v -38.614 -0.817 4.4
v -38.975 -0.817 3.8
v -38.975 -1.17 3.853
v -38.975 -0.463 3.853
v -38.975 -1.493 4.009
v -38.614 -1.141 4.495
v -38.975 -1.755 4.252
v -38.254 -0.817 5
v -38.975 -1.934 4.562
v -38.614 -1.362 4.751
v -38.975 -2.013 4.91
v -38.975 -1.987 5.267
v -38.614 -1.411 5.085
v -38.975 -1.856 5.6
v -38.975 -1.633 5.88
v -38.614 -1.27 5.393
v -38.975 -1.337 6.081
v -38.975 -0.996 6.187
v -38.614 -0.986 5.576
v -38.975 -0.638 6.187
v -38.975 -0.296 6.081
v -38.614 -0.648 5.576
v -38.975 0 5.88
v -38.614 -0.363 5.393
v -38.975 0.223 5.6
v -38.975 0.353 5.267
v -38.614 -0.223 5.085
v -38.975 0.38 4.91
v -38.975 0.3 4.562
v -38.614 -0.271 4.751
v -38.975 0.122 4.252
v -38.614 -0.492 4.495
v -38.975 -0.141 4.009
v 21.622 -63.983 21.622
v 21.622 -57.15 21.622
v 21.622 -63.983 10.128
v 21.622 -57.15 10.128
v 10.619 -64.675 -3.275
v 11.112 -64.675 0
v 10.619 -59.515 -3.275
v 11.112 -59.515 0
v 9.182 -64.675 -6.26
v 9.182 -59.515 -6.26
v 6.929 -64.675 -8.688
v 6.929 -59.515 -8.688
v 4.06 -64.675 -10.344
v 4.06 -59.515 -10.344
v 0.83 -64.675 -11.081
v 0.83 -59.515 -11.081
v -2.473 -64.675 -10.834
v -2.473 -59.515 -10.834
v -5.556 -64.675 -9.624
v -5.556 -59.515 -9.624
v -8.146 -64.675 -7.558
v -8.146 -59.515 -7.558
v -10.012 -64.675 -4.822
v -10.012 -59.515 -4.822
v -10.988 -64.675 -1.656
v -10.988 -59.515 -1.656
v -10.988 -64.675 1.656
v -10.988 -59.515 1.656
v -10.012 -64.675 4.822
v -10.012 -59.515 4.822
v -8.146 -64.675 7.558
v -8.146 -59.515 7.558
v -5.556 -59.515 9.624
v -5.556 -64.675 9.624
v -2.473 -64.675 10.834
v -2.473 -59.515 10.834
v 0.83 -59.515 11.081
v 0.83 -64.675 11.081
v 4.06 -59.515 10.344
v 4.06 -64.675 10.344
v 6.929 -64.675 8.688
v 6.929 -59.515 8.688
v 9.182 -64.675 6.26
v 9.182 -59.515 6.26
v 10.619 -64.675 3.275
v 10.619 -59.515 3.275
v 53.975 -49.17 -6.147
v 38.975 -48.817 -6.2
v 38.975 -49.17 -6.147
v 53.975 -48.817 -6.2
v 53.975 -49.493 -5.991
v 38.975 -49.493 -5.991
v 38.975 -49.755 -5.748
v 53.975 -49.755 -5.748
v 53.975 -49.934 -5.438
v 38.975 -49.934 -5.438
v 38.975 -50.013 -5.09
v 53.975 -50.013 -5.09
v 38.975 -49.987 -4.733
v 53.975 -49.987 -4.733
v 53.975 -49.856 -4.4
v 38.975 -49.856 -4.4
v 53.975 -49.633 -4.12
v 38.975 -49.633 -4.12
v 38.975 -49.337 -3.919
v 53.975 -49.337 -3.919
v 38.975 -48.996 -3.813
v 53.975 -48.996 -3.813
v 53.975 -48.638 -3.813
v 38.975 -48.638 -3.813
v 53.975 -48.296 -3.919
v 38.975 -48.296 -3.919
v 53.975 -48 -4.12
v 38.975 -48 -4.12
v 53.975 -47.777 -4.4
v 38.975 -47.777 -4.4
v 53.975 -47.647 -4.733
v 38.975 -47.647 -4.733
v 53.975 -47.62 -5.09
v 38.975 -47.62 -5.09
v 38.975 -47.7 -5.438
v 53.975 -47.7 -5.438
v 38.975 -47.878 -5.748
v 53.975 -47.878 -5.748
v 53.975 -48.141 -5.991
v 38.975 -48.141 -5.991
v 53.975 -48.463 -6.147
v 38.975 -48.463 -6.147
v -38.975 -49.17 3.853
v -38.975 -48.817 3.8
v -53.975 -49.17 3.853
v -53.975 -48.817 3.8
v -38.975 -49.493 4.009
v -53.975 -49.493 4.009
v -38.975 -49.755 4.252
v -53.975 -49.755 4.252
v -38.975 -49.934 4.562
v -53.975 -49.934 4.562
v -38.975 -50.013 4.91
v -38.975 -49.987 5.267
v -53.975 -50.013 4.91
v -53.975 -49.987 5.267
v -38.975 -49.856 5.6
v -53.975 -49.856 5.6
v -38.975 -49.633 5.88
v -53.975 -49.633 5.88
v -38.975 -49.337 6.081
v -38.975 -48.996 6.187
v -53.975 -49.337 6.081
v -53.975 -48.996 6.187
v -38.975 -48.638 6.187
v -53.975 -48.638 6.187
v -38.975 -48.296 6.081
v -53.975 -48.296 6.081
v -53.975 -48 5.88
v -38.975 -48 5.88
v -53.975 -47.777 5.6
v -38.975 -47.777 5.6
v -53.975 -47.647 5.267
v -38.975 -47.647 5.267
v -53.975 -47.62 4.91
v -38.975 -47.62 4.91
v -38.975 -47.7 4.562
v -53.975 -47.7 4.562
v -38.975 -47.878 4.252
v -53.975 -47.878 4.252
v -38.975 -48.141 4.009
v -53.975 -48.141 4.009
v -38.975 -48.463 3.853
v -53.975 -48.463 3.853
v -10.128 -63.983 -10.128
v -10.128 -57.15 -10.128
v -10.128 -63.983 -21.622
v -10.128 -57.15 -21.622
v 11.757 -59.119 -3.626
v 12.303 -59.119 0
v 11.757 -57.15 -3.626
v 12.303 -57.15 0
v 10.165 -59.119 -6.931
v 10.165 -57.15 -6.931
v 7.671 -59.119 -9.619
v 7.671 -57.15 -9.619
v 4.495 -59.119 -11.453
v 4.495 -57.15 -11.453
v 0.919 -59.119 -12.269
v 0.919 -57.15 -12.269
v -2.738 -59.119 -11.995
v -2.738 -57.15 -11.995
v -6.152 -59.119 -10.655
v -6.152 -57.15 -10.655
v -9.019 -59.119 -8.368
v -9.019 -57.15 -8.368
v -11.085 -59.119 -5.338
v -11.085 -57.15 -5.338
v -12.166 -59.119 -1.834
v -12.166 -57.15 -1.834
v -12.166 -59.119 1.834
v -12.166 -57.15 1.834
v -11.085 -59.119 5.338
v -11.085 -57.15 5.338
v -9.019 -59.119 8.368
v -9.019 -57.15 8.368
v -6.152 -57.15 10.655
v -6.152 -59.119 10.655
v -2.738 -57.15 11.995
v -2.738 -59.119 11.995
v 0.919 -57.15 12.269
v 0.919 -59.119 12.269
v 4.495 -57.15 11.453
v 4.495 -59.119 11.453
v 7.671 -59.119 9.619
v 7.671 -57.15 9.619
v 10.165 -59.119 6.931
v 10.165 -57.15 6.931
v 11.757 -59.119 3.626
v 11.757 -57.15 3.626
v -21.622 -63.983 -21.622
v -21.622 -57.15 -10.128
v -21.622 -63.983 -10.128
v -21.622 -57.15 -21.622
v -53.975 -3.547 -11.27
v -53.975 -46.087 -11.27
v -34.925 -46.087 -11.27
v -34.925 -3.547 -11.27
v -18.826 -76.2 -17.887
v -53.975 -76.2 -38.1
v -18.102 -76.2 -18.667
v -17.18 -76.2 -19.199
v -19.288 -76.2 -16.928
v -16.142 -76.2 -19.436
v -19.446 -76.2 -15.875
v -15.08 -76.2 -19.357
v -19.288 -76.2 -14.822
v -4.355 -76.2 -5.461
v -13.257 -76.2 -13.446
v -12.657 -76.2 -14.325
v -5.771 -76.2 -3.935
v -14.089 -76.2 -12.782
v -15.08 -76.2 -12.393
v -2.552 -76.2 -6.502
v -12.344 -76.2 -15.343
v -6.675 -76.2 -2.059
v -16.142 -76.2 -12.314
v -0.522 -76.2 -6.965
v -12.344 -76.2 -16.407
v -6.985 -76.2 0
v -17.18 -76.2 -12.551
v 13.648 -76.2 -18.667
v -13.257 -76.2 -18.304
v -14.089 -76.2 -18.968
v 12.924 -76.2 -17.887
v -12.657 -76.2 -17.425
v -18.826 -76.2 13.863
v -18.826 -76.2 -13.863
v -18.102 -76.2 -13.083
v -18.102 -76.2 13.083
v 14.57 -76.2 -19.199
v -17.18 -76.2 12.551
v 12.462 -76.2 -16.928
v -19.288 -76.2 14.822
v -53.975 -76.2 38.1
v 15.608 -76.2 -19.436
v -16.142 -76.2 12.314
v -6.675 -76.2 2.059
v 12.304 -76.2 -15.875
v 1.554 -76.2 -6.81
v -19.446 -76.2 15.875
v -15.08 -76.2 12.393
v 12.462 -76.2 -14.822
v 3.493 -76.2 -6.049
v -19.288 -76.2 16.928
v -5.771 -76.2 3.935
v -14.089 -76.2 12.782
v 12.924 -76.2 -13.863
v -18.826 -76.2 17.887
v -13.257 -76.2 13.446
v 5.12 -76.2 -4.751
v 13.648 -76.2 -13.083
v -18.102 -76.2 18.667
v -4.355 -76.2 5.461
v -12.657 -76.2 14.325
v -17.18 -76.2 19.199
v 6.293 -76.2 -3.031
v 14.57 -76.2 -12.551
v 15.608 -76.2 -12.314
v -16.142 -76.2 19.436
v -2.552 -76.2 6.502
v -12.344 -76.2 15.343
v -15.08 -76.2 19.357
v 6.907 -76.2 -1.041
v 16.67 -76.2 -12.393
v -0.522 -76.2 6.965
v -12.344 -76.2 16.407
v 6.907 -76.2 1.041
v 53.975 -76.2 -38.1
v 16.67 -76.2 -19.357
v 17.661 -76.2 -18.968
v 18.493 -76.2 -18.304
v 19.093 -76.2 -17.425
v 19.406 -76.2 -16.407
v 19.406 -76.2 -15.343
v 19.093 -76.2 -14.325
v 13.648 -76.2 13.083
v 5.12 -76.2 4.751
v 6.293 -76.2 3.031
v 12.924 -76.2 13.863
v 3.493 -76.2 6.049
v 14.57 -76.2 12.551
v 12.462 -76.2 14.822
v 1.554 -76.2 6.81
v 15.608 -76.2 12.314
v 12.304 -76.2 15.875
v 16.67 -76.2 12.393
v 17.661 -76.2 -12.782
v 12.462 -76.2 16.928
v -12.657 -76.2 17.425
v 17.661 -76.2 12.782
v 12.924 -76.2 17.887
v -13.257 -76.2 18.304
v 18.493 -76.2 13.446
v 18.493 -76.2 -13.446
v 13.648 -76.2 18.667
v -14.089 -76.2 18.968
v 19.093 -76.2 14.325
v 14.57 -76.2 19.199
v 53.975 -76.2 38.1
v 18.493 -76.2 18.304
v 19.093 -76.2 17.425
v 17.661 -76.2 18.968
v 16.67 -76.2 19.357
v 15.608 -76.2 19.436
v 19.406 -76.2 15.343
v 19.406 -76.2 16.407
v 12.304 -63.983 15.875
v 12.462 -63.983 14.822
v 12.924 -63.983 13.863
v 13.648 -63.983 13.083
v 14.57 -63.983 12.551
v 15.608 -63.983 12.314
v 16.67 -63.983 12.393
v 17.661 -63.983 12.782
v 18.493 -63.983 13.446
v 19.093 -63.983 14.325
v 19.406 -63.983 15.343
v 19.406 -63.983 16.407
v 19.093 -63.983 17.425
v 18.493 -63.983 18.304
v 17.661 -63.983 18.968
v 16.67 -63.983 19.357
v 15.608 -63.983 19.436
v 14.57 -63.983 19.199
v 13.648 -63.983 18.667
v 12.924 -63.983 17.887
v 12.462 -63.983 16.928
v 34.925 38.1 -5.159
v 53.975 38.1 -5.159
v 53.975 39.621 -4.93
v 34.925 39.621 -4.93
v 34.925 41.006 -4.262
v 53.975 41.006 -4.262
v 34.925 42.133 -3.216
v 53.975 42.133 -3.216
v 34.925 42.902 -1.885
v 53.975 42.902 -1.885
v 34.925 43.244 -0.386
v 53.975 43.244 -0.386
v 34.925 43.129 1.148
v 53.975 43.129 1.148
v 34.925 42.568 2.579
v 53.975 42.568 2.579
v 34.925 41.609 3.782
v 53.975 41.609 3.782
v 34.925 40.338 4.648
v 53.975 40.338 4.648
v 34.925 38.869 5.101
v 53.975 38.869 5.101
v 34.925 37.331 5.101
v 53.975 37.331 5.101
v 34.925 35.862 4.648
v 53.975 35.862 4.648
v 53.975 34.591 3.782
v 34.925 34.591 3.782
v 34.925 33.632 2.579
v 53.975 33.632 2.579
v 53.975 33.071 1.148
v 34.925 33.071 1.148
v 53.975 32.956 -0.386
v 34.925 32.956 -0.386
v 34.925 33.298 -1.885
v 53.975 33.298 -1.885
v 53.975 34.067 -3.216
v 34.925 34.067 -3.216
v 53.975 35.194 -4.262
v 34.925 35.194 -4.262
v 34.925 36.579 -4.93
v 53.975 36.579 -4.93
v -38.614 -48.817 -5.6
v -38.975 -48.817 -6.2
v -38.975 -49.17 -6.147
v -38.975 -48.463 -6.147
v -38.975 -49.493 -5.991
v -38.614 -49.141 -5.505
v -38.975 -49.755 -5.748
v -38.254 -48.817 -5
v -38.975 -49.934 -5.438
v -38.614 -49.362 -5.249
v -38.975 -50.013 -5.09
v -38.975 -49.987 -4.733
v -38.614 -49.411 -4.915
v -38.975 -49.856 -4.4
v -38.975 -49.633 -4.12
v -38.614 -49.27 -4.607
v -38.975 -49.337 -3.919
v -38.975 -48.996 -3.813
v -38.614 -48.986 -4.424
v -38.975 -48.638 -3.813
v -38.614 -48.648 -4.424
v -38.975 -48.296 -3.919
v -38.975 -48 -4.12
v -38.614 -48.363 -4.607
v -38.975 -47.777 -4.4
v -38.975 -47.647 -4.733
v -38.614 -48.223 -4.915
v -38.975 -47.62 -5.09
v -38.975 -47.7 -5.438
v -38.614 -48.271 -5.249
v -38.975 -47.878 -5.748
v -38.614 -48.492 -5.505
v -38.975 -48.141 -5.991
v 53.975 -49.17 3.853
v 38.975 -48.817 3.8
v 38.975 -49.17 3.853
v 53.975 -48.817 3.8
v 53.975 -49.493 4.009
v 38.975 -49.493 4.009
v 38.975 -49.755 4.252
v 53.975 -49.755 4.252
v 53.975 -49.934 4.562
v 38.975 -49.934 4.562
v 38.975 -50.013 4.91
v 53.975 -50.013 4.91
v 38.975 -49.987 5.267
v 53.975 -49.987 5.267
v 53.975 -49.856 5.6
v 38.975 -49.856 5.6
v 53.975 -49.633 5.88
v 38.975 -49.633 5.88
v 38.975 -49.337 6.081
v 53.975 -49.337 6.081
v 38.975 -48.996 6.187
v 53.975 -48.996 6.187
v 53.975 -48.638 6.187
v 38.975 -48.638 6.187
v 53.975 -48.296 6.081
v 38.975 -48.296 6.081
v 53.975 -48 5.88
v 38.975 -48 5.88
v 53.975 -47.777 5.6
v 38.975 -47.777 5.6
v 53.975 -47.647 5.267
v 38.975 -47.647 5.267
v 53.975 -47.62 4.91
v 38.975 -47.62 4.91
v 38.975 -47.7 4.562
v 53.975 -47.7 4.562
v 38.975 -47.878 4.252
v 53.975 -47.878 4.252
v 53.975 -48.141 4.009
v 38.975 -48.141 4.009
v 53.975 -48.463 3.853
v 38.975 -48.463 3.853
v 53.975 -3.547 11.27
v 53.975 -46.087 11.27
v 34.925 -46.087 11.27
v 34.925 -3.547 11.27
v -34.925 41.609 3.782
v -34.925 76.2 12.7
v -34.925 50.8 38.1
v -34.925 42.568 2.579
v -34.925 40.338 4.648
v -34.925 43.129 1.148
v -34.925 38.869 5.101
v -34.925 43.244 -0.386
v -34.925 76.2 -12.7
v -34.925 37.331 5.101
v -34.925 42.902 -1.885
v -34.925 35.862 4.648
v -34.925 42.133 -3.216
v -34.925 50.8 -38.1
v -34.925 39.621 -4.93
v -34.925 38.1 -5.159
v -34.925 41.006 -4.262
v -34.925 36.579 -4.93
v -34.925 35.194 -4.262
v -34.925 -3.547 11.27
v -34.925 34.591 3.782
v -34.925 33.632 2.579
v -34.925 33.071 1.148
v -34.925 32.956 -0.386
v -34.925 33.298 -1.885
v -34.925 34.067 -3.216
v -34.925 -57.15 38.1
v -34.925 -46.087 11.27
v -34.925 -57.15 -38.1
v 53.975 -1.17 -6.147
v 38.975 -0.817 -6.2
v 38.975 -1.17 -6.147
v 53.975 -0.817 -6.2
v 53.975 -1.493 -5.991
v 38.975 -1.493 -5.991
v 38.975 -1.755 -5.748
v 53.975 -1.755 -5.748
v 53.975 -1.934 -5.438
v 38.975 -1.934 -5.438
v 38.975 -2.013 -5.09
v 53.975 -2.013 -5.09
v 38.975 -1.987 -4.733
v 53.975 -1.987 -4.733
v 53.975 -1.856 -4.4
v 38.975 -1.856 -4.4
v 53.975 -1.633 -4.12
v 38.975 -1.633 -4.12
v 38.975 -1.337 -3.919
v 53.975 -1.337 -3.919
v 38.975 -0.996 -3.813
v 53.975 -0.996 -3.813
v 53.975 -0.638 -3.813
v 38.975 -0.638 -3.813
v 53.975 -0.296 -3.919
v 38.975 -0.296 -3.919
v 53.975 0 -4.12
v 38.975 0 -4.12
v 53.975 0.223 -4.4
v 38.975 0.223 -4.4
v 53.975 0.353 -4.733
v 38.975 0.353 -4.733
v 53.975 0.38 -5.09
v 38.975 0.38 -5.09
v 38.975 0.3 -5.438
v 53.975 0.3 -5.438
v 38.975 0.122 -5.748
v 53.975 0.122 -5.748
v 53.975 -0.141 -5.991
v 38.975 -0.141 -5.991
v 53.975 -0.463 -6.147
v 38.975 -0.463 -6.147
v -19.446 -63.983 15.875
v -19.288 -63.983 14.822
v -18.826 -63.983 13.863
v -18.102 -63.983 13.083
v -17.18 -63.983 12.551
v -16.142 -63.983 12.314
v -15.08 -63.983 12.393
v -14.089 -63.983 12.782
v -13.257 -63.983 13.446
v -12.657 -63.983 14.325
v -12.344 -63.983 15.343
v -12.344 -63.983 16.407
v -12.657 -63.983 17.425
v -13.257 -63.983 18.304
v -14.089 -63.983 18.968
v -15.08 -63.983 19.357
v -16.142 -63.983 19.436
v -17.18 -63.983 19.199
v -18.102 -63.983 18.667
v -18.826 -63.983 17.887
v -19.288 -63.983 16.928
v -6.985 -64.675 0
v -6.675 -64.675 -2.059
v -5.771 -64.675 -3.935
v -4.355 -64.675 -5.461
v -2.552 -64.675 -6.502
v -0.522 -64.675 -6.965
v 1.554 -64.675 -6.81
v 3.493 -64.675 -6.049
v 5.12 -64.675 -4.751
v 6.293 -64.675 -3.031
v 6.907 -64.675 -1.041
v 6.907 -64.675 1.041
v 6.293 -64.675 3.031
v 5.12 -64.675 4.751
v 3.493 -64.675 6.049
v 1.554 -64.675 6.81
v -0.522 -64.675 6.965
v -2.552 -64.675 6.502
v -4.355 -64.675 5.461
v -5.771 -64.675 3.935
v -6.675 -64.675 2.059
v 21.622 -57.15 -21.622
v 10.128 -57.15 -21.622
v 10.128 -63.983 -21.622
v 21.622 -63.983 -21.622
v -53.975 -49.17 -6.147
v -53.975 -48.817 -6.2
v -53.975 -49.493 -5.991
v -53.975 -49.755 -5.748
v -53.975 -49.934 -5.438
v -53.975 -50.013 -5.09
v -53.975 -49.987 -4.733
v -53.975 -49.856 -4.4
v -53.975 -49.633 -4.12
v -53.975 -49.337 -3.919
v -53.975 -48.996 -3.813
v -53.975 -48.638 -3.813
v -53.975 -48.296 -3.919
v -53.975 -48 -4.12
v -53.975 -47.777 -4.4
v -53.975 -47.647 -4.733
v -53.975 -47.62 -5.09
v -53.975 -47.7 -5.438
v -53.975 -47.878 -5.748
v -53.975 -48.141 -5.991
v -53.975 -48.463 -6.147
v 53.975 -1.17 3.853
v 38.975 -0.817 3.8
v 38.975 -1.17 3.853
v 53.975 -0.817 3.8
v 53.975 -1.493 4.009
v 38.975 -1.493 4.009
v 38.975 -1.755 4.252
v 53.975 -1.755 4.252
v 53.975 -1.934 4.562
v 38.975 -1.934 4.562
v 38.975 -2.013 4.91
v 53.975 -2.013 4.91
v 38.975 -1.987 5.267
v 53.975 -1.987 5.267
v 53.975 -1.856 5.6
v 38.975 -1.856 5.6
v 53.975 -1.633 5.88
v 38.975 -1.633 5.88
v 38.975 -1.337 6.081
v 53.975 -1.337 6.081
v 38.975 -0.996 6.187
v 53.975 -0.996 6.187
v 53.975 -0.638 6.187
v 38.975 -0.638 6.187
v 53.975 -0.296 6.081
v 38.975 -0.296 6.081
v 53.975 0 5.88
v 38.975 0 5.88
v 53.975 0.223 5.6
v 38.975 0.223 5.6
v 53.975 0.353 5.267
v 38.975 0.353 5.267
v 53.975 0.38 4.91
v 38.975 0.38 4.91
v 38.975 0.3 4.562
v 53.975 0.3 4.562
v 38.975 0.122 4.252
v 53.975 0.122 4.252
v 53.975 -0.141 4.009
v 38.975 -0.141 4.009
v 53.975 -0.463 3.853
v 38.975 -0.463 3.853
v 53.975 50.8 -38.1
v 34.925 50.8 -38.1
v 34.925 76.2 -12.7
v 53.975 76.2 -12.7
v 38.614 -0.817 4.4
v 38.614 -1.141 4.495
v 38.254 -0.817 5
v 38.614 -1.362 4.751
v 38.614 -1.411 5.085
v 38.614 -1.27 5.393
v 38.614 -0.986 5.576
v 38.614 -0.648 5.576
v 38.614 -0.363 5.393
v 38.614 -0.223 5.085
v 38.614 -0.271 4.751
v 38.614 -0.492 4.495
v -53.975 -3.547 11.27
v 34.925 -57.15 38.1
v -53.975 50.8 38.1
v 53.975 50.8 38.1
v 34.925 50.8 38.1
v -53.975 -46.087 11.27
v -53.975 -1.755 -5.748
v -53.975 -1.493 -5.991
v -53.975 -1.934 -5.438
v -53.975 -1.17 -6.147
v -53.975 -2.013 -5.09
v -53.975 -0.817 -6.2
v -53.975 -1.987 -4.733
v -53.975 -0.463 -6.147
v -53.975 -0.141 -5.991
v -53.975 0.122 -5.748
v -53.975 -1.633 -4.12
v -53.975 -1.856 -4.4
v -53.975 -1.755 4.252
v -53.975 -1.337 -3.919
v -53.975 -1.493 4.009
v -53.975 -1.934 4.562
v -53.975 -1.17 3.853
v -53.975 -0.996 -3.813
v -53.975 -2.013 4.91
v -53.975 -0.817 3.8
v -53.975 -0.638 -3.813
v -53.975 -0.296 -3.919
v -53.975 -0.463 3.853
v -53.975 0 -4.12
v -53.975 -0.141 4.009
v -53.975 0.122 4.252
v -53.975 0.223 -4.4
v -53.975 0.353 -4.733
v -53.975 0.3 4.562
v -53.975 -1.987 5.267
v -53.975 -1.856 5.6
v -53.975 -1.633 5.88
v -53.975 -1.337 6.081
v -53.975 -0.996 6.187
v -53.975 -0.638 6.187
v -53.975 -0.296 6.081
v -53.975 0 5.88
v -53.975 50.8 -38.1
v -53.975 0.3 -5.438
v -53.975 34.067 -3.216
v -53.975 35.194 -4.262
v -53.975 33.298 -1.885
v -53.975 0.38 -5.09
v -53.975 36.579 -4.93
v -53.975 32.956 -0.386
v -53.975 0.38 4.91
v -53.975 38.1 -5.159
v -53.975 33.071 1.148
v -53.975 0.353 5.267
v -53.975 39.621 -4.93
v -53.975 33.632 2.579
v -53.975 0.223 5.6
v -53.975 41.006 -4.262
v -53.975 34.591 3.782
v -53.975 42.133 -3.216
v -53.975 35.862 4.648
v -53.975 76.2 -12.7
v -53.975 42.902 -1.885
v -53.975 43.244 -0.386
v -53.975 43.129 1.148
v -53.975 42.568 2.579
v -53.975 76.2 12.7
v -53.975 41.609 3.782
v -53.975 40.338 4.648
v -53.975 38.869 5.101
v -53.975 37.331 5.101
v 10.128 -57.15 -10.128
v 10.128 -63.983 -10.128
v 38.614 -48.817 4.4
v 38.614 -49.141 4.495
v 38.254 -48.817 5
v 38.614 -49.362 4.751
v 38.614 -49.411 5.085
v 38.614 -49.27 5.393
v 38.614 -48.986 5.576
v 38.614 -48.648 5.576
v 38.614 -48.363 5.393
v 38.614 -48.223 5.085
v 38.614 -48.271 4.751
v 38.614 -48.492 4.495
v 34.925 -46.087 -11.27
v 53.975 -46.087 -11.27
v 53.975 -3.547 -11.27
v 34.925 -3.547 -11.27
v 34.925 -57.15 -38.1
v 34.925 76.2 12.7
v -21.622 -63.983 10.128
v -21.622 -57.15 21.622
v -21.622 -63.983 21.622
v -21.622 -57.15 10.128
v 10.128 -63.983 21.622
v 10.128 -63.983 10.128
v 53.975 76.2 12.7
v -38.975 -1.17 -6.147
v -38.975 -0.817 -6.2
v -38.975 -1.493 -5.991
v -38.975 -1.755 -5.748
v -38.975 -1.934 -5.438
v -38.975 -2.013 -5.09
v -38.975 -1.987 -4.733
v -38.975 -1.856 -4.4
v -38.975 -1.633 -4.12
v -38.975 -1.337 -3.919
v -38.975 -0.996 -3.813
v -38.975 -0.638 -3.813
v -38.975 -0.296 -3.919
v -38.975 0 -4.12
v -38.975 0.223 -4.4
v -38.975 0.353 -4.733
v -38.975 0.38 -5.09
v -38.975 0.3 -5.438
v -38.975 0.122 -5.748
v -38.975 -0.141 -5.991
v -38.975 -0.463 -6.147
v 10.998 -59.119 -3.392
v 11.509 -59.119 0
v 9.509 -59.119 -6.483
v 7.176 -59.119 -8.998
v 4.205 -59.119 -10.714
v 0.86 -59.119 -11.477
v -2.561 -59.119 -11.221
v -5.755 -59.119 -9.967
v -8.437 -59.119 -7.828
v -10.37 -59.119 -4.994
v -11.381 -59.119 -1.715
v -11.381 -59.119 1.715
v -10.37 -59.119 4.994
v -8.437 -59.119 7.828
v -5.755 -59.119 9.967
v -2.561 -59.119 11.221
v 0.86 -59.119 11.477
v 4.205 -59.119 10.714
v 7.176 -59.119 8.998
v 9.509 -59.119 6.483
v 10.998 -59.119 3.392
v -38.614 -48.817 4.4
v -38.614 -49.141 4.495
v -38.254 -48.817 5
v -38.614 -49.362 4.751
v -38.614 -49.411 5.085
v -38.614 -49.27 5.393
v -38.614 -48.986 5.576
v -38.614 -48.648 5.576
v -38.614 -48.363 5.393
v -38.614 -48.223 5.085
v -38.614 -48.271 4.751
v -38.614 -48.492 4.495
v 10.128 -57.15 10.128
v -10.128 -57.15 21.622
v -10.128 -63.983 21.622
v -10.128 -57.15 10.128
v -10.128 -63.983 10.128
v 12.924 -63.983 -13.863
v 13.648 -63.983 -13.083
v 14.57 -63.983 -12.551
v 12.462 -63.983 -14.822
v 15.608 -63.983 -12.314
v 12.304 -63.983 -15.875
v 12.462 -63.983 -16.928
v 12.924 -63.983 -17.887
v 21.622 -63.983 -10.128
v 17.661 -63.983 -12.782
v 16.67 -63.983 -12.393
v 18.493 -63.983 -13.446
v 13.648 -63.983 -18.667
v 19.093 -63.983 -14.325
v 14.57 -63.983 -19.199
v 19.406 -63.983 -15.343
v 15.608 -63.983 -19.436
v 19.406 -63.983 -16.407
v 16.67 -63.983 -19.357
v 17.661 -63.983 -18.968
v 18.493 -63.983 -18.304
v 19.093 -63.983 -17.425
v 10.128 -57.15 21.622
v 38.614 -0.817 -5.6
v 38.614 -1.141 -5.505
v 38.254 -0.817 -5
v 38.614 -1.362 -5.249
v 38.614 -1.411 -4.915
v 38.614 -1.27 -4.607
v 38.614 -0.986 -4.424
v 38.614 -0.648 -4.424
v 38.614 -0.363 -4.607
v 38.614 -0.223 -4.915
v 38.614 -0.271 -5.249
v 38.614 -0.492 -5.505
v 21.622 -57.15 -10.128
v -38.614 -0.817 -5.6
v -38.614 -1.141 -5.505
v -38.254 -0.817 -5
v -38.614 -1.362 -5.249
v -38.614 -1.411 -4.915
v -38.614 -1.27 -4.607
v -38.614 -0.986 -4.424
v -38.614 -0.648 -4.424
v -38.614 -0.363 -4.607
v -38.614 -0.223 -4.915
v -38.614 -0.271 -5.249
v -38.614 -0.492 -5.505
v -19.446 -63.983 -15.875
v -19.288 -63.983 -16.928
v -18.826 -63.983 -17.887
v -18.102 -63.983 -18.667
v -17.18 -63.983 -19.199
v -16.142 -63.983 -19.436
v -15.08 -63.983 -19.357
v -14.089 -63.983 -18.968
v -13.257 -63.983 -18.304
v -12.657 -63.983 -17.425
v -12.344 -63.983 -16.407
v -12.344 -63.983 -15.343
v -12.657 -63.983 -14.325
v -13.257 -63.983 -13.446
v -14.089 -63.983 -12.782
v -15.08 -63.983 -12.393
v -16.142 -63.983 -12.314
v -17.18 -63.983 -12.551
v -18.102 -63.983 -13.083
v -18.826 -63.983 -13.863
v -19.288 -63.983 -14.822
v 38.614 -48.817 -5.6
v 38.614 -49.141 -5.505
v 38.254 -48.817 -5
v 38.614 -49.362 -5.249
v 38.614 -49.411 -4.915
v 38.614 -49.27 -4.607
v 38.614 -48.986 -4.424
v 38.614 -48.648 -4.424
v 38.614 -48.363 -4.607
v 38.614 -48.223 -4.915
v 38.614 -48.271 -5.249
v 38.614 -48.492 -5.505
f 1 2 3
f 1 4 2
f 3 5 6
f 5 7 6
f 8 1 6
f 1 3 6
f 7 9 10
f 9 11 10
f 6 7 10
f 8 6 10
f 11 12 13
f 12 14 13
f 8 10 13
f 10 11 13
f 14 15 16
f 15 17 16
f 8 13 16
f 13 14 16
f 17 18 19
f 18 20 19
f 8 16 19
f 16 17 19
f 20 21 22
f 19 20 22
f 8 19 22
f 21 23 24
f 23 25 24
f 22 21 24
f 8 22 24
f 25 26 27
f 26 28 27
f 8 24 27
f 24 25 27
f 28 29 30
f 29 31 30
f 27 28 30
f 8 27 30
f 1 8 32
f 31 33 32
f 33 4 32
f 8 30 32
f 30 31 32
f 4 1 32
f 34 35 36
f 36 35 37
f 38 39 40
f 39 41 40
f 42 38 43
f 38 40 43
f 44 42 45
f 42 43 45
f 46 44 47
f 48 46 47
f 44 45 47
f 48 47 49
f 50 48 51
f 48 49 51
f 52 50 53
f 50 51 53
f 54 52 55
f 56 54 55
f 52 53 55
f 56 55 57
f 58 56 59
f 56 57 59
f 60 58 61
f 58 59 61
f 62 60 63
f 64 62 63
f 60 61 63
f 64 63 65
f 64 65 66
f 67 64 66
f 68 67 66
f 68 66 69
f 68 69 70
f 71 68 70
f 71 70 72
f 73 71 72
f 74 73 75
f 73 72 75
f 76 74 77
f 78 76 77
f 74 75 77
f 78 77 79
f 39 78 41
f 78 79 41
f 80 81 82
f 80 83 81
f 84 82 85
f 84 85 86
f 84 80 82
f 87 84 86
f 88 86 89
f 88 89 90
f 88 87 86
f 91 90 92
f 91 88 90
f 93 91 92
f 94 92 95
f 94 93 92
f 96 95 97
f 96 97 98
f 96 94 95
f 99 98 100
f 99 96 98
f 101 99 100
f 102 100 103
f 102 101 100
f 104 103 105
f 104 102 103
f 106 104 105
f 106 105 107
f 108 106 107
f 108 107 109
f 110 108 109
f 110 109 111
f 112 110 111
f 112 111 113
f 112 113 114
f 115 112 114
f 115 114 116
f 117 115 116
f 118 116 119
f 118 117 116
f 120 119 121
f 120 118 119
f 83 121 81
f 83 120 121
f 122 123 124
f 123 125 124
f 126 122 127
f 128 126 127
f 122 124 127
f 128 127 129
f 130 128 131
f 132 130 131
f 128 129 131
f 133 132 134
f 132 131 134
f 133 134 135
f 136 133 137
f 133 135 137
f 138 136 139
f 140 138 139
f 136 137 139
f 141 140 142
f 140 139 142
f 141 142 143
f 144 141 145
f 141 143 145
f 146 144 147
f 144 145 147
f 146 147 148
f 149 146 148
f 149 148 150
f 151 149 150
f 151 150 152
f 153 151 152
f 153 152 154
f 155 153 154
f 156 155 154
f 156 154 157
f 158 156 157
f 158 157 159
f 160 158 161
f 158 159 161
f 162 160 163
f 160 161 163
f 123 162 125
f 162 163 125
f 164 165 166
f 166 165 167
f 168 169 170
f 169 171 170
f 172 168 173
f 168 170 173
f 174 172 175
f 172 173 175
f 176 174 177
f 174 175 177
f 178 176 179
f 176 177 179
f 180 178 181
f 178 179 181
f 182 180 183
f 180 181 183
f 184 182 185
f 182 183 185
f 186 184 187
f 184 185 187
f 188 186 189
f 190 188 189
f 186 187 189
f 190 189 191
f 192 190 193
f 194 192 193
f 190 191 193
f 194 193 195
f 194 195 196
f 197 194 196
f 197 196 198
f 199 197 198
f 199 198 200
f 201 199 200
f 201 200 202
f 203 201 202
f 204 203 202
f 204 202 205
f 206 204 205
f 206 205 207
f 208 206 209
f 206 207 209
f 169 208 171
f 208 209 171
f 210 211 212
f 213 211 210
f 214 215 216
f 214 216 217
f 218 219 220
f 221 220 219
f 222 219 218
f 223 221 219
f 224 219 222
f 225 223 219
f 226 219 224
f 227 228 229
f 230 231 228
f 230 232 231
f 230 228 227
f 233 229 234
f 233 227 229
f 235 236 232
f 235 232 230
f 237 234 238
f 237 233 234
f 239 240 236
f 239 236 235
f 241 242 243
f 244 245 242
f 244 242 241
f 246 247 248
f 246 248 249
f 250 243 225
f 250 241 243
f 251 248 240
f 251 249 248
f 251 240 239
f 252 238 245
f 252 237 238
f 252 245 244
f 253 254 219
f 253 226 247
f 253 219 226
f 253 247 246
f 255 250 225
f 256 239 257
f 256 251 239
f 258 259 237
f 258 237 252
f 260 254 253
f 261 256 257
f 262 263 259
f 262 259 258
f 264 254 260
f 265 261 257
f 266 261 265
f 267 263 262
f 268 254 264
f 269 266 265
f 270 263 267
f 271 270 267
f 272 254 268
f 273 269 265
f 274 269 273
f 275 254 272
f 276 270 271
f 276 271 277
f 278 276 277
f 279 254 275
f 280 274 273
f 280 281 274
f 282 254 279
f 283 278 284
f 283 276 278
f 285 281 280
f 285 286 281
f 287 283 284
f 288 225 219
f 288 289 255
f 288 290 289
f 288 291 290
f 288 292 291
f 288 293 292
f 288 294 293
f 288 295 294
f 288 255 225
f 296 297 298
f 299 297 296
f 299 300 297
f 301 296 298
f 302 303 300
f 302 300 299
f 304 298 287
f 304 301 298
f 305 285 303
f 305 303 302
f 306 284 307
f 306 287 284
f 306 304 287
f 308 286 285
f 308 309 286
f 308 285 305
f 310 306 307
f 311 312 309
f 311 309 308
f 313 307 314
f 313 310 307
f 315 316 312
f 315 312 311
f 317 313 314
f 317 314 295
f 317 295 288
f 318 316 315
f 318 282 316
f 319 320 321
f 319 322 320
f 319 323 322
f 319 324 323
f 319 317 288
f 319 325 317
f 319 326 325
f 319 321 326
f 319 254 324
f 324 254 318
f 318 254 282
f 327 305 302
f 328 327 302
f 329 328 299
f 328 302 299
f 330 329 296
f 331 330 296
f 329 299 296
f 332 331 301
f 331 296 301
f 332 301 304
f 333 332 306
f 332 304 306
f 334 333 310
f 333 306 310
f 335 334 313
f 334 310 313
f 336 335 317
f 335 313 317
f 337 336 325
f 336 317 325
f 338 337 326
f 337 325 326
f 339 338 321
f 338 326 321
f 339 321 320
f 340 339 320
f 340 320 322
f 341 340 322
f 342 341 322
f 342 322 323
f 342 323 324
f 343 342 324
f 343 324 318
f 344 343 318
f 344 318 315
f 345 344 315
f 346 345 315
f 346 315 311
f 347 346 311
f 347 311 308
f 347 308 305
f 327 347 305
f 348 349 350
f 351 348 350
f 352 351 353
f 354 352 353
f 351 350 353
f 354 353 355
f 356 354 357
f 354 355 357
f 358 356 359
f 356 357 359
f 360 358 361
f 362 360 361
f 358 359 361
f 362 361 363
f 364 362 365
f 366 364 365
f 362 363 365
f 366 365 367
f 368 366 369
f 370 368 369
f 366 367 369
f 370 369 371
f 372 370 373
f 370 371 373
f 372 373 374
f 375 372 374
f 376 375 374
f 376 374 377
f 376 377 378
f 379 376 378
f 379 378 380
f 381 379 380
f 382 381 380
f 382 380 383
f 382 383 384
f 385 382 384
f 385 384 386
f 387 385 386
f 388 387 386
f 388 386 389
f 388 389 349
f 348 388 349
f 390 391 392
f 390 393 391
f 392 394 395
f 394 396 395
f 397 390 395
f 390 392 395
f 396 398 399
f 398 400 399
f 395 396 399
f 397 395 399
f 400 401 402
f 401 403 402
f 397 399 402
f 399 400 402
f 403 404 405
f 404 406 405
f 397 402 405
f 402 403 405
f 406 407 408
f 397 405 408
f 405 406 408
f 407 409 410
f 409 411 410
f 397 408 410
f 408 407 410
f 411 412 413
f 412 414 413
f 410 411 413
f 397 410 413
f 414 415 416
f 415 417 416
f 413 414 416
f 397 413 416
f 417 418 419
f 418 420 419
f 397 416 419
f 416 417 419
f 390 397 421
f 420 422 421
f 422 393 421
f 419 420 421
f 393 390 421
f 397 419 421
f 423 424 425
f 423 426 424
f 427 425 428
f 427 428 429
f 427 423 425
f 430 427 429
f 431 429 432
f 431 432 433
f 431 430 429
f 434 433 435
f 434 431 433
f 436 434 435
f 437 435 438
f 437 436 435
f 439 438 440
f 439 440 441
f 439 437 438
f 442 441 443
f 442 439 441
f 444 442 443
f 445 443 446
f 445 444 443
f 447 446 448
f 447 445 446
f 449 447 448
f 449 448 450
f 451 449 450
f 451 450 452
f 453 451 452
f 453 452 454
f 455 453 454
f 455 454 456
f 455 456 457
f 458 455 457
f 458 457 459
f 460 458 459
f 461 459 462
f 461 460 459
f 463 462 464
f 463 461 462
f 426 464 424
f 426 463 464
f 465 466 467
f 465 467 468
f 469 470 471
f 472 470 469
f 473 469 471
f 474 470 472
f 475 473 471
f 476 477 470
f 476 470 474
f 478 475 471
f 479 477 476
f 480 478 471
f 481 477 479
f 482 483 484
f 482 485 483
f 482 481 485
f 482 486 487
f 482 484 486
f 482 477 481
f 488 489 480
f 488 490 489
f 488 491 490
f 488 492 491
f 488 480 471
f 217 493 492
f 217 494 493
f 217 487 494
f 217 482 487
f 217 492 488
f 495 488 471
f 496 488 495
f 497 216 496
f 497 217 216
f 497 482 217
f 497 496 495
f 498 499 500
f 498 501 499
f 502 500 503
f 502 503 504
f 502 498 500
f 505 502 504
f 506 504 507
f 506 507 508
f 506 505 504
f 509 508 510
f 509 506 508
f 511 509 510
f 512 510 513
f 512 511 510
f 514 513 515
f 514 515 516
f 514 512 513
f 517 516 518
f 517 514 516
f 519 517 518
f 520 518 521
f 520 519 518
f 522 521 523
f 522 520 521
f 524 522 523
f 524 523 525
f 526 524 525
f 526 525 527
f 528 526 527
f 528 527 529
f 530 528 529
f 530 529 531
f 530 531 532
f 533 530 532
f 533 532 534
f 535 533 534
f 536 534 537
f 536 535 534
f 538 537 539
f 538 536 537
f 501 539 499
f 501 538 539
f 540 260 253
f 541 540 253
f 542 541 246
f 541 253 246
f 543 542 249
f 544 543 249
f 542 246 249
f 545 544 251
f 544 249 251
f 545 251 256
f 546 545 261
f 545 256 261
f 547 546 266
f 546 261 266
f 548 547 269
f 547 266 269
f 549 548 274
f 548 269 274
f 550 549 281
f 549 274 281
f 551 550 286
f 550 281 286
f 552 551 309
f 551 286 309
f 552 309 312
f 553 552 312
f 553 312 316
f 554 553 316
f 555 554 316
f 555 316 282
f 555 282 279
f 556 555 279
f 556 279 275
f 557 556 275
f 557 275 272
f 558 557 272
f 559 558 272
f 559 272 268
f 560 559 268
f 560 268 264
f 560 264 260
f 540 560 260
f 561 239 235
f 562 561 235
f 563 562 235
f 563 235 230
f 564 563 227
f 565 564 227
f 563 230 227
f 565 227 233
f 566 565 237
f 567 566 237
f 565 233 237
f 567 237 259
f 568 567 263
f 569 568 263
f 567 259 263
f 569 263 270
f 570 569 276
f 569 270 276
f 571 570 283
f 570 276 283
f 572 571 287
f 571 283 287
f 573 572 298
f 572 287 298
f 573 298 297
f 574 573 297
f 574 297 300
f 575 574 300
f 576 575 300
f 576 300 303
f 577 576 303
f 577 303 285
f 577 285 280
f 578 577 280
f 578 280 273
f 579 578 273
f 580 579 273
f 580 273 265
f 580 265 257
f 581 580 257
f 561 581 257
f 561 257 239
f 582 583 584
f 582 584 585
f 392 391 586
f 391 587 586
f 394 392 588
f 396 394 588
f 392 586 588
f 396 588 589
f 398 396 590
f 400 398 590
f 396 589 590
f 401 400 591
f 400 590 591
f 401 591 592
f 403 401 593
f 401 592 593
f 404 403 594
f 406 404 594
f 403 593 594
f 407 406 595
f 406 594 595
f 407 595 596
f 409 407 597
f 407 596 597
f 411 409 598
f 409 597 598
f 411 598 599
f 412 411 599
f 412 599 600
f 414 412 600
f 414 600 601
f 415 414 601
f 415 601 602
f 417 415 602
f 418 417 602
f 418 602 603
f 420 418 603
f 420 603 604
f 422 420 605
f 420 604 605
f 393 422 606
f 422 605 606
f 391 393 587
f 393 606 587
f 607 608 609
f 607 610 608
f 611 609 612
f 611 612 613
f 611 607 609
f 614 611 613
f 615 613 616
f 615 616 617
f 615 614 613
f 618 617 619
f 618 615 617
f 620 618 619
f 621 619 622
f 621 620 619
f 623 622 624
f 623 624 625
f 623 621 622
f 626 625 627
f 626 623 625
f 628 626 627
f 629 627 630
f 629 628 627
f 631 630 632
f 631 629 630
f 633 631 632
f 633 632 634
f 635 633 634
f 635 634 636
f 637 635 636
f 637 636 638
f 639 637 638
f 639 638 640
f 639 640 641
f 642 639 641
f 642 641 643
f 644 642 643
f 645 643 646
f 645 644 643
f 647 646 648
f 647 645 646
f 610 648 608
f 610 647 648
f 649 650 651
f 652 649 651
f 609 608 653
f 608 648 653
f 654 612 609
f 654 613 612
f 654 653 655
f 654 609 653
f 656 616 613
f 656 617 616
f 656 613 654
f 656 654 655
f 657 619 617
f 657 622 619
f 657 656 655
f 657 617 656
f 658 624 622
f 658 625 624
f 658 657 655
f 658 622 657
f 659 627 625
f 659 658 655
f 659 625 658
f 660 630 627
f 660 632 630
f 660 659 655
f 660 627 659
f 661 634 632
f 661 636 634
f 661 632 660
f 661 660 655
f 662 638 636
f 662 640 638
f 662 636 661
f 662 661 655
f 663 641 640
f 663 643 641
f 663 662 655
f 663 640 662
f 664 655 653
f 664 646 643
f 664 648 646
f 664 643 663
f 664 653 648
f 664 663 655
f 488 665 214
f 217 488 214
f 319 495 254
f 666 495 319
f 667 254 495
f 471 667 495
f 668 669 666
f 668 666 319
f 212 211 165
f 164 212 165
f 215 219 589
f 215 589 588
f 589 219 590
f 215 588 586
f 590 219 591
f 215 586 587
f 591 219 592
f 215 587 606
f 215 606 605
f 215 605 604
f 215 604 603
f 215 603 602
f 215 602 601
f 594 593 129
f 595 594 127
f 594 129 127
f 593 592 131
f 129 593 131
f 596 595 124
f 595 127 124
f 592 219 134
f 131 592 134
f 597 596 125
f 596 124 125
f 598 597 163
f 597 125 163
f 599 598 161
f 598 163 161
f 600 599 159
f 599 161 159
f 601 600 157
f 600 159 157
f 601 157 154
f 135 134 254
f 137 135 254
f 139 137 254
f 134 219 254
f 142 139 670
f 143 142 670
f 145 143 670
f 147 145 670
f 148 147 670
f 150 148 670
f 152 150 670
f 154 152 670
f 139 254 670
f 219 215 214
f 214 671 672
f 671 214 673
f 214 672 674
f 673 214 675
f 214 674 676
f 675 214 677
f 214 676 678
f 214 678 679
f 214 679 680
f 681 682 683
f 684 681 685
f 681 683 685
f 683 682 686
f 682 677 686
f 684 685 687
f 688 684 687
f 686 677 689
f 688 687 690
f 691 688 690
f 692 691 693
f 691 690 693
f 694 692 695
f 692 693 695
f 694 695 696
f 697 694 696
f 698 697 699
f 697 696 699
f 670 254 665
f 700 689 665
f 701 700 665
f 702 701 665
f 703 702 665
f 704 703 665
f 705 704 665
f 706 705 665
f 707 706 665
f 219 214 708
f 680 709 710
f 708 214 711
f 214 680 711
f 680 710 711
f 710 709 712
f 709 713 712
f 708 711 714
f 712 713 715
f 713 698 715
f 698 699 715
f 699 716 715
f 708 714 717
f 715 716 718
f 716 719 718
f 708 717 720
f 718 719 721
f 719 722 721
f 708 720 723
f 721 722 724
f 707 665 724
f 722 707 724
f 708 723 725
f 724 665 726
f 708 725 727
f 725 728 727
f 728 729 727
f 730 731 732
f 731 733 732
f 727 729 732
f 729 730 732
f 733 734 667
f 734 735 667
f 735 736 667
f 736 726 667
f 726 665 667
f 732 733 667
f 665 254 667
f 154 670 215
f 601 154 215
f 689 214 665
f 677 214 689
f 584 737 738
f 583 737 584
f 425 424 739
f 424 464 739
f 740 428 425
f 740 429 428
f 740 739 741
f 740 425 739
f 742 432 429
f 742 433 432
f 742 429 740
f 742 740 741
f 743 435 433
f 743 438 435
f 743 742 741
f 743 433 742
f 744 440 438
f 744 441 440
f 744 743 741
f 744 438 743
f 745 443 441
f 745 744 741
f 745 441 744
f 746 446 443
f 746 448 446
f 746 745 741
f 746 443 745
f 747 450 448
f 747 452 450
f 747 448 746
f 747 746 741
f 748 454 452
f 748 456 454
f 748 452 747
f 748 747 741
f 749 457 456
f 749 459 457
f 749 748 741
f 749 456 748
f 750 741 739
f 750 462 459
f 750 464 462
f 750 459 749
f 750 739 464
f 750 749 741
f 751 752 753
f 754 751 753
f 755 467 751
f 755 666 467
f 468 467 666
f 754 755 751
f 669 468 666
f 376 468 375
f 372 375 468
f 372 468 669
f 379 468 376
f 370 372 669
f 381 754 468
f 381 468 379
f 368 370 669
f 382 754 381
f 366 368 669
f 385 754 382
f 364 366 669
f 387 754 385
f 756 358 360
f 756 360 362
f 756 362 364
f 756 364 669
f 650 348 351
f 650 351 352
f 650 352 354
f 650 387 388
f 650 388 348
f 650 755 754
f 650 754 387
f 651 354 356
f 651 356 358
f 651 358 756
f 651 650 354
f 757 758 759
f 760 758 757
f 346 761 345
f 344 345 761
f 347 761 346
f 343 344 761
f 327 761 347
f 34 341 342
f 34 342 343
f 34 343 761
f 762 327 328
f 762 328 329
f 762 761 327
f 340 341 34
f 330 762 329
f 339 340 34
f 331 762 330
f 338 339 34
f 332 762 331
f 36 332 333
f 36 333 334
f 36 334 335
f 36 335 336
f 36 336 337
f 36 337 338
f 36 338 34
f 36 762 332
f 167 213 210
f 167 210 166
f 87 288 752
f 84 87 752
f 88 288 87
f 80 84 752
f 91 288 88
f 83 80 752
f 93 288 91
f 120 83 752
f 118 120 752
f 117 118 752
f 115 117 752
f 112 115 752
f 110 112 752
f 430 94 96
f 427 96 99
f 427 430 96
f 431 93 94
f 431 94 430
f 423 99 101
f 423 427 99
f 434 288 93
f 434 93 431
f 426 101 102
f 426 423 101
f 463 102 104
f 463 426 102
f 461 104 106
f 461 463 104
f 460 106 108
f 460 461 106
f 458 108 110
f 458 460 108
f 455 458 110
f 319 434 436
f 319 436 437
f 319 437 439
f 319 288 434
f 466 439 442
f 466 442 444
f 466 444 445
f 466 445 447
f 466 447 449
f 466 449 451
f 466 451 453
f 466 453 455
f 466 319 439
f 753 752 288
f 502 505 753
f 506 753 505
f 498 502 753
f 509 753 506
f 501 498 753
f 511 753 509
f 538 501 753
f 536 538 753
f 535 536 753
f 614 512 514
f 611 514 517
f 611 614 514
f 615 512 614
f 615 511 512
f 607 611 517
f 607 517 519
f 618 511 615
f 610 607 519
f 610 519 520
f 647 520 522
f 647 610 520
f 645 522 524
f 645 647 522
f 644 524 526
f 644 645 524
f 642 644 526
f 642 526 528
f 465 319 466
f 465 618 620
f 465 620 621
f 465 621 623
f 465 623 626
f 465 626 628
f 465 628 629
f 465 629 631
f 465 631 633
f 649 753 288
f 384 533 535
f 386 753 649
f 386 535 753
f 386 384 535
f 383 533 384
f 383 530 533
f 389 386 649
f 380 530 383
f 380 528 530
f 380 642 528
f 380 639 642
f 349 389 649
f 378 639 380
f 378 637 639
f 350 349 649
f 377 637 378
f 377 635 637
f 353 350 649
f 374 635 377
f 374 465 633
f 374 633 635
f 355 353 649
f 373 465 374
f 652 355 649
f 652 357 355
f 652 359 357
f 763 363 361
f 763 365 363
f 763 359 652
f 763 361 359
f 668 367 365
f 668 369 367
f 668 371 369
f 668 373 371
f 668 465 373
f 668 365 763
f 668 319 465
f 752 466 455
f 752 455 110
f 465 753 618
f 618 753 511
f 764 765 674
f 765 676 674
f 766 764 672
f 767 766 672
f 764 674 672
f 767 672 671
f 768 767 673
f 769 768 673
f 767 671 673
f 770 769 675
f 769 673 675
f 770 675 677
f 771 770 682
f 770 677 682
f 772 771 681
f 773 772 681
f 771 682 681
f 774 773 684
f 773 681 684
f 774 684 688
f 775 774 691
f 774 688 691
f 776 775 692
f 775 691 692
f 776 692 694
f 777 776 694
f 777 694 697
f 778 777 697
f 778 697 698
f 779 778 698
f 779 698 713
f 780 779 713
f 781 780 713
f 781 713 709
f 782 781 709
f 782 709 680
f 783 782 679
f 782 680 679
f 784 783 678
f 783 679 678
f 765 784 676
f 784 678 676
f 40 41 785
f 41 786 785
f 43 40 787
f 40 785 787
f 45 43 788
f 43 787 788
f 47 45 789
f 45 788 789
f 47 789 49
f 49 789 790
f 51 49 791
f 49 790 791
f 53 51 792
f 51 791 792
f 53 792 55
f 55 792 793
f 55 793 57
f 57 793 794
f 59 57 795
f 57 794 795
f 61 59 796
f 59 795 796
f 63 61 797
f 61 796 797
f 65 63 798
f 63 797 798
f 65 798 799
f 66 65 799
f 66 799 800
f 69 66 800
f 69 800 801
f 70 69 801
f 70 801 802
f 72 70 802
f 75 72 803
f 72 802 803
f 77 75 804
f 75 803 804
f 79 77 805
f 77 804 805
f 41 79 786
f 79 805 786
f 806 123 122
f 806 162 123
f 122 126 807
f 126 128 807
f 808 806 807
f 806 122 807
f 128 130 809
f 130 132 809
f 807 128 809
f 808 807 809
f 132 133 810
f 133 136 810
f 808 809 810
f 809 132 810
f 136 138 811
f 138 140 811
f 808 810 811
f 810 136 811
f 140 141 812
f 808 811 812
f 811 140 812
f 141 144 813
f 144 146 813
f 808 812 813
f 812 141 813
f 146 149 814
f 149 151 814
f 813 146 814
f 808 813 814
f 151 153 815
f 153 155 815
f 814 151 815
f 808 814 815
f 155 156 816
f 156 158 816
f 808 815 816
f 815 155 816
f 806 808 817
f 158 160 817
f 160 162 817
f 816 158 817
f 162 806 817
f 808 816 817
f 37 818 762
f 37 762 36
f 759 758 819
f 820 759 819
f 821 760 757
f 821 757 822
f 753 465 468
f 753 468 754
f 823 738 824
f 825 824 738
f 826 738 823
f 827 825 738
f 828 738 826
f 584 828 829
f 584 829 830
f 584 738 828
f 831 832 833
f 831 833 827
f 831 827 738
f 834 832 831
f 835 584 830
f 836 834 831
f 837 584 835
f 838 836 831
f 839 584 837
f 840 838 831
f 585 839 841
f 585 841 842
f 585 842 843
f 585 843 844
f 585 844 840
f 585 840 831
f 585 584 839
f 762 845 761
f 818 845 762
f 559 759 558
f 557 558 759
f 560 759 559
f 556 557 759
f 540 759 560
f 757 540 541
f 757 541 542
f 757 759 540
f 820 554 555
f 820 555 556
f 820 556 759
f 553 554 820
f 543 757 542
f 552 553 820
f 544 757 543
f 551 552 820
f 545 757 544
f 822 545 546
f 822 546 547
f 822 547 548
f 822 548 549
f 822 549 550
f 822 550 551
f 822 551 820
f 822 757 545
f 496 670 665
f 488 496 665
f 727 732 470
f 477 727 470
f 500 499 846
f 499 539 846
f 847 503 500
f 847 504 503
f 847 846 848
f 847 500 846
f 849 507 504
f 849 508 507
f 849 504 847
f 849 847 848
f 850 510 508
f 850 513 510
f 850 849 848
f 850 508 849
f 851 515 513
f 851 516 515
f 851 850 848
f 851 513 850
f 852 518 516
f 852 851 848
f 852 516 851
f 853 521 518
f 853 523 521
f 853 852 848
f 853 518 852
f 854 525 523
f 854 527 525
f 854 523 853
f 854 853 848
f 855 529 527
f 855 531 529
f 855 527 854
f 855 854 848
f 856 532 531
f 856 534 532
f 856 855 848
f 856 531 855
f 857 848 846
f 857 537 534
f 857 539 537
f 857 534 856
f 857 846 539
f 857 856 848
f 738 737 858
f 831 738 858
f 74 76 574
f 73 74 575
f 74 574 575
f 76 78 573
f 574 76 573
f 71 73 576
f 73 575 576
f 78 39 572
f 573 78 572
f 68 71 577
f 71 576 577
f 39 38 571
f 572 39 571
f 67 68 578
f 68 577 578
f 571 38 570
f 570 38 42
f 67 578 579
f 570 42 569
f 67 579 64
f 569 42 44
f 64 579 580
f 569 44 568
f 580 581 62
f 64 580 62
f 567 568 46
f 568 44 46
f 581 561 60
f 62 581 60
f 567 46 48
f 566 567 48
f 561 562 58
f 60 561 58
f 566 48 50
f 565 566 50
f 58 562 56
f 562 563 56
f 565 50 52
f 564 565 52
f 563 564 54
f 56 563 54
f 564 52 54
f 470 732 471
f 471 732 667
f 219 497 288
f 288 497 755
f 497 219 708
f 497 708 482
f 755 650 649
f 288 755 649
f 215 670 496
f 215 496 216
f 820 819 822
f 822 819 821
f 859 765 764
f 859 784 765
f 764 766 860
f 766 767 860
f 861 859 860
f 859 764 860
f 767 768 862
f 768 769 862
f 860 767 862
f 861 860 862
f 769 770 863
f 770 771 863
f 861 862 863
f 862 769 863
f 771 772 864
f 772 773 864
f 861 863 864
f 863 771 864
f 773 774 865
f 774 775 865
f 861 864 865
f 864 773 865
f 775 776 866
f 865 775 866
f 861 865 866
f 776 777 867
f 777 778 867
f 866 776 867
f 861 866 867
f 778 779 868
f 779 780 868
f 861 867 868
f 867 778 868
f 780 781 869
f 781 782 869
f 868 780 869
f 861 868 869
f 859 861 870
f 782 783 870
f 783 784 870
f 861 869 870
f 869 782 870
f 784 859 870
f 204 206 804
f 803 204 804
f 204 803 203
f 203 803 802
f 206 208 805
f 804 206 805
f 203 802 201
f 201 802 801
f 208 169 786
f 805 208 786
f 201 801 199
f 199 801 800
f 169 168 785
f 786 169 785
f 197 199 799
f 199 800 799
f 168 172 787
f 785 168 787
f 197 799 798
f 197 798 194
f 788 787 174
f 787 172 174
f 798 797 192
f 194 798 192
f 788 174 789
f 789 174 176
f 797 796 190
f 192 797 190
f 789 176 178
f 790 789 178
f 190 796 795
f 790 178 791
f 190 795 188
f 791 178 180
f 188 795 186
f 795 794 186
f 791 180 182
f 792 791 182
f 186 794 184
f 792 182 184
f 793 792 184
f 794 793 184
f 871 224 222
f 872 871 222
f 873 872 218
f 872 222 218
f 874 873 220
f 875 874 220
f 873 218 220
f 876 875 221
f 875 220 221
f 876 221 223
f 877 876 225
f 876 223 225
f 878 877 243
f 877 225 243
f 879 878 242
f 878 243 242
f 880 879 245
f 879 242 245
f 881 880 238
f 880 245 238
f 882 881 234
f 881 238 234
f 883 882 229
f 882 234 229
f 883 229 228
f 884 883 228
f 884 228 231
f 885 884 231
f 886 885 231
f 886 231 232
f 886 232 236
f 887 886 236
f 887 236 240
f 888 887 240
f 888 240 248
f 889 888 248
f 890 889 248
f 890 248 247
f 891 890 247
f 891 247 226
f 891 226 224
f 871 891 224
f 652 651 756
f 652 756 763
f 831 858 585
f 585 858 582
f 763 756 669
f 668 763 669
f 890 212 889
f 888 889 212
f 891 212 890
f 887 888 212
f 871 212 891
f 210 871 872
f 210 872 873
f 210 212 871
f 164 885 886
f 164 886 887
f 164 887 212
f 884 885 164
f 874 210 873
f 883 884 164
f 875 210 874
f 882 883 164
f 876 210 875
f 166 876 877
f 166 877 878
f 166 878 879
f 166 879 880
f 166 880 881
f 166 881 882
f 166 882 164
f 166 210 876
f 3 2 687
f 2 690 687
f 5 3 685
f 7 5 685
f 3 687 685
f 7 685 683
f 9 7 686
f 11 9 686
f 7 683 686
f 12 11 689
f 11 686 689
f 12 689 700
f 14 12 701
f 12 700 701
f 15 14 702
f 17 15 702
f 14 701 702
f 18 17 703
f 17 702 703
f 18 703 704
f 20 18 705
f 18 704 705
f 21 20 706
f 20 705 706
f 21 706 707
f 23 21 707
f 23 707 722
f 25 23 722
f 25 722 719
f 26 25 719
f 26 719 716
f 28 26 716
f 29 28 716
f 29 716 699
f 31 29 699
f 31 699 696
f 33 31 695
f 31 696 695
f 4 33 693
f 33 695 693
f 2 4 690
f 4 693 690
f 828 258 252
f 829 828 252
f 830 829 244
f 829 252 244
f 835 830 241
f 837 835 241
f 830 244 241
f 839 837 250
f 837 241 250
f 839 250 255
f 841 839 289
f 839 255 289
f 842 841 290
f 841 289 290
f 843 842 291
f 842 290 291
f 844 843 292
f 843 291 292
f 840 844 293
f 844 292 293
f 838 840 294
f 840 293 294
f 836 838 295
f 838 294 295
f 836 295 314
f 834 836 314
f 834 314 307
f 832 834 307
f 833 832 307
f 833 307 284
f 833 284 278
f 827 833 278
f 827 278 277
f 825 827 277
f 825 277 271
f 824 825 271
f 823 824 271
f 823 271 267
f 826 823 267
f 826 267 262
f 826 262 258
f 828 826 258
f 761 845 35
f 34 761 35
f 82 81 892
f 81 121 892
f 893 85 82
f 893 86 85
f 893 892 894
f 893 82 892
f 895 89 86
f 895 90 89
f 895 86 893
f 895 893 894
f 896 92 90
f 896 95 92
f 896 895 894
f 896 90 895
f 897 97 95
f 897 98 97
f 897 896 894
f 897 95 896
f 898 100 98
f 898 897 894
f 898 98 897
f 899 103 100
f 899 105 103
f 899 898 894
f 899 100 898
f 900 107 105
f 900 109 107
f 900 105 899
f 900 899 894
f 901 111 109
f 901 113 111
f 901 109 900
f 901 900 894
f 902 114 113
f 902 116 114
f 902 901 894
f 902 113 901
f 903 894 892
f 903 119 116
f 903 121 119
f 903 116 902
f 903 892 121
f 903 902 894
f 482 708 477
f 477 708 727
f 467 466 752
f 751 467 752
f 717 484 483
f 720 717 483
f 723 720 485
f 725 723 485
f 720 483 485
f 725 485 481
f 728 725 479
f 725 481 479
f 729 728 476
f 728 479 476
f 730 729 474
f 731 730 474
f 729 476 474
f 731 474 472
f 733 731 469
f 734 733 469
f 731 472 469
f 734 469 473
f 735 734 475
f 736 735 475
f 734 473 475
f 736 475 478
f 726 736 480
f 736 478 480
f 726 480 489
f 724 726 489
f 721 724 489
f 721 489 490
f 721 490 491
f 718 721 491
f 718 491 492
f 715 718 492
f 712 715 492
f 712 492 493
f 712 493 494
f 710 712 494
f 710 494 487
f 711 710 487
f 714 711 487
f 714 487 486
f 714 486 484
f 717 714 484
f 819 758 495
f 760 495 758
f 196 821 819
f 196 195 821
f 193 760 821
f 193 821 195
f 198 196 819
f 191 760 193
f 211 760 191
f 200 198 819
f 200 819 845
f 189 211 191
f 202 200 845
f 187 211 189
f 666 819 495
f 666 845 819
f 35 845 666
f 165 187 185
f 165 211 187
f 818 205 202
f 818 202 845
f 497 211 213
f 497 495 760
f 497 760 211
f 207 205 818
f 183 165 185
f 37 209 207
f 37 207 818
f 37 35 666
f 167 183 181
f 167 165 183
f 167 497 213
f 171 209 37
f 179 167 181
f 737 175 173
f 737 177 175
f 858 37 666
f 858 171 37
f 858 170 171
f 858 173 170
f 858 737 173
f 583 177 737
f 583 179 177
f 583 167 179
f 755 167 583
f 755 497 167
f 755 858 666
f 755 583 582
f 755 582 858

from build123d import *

# Parameters (mm, degrees)
SKETCH27_W                    = 107.95
SKETCH27_H                    = 152.4
BOSS_EXTRUDE4_DEPTH           = 38.1
CUT_EXTRUDE5_DEPTH            = 101.853114107
CUT_EXTRUDE5_DEPTH_BACK       = 101.853114107
CUT_EXTRUDE6_DEPTH            = 101.853114107
CUT_EXTRUDE6_DEPTH_BACK       = 101.853114107
SKETCH30_OUTSIDE_W            = 118.542
SKETCH30_OUTSIDE_H            = 194.742
F_3_8_CLEARANCE_HOLE4_D       = 10.31748
CUT_EXTRUDE8_REACH            = 139.518
SKETCH49_W                    = 22.54
SKETCH49_H                    = 42.54
M2_CLEARANCE_HOLE2_AT_2_COUNT = 2
M2_CLEARANCE_HOLE2_AT_2_PITCH = 10
M2_CLEARANCE_HOLE2_AT_3_COUNT = 2
M2_CLEARANCE_HOLE2_AT_3_PITCH = 49.030602689
M2_CLEARANCE_HOLE2_AT_4_COUNT = 2
M2_CLEARANCE_HOLE2_AT_4_PITCH = 48
F_1_4_CLEARANCE_HOLE1_D       = 7.14248
SKETCH53_W                    = 11.4935
SKETCH53_H                    = 11.4935
CUT_EXTRUDE9_DEPTH            = 6.8326
F_3_8_CLEARANCE_HOLE5_D       = 13.97


with BuildPart() as part:
    # Sketch27 → Boss-Extrude4 (new, symmetric)
    with BuildSketch(Plane.XY):
        Rectangle(SKETCH27_W, SKETCH27_H)
    extrude(amount=BOSS_EXTRUDE4_DEPTH, both=True)

    # Sketch28 → Cut-Extrude5 (cut, two sides: drawn at the far end of the back side and taken through both)
    with BuildSketch(Plane.XY.offset(-CUT_EXTRUDE5_DEPTH_BACK)):
        Polygon((-34.925, 439.068077332), (-34.925, 76.2), (-34.925, -57.15), (34.925, -57.15), (34.925, 76.2), (34.925, 439.068077332), (34.925, 1164.804231996), (-34.925, 1164.804231996), align=None)
    extrude(amount=CUT_EXTRUDE5_DEPTH + CUT_EXTRUDE5_DEPTH_BACK, mode=Mode.SUBTRACT)

    # Sketch30 outside → Cut-Extrude6 (cut, two sides: drawn at the far end of the back side and taken through both)
    with BuildSketch(Plane(origin=(0, 0, 0), x_dir=(0, 0, -1), z_dir=(1, 0, 0)).offset(-CUT_EXTRUDE6_DEPTH_BACK)):
        Rectangle(SKETCH30_OUTSIDE_W, SKETCH30_OUTSIDE_H)
        Polygon((-38.1, 50.8), (-38.1, -76.2), (38.1, -76.2), (38.1, 50.8), (12.7, 76.2), (-12.7, 76.2), align=None, mode=Mode.SUBTRACT)
    extrude(amount=CUT_EXTRUDE6_DEPTH + CUT_EXTRUDE6_DEPTH_BACK, mode=Mode.SUBTRACT)

    # 3/8 Clearance Hole4 (through all)
    with Locations(Plane.ZY.offset(53.975)):
        with Locations((0, 38.1)):
            Hole(F_3_8_CLEARANCE_HOLE4_D / 2)

    # Sketch49 → Cut-Extrude8 (cut, up to next)
    with BuildSketch(Plane(origin=(53.975, 0, 0), x_dir=(0, 0, -1), z_dir=(1, 0, 0)), mode=Mode.PRIVATE) as cut_extrude8_sk1:
        with Locations((0, -24.816666667)):
            Rectangle(SKETCH49_W, SKETCH49_H)
    cut_extrude8_tool1 = extrude(cut_extrude8_sk1.sketch, amount=-CUT_EXTRUDE8_REACH, mode=Mode.PRIVATE) & part.part
    cut_extrude8 = cut_extrude8_tool1.solids().sort_by_distance((53.975, -24.816667, 0))[0]
    add(cut_extrude8, mode=Mode.SUBTRACT)

    # Sketch51 → M2 Clearance Hole2 (revolve, cut)
    with BuildSketch(Plane(origin=(53.975, -48.816666667, 5), x_dir=(0, 0, -1), z_dir=(0, 1, 0))):
        Polygon((0, 0), (0, 15.721028143), (1.2, 14.9999954), (1.2, 0), align=None)
    m2_clearance_hole2 = revolve(axis=Axis((60.325, -48.816666667, 5), (-1, 0, 0)), mode=Mode.SUBTRACT)

    # M2 Clearance Hole2 at 2: M2 Clearance Hole2 ×2
    with Locations(*[(0, 0, -i * M2_CLEARANCE_HOLE2_AT_2_PITCH) for i in range(1, M2_CLEARANCE_HOLE2_AT_2_COUNT)]):
        add(m2_clearance_hole2, mode=Mode.SUBTRACT)

    # M2 Clearance Hole2 at 3: M2 Clearance Hole2 ×2
    with Locations(*[Vector(0, 0.9789804197376051, -0.20395425411200102) * (i * M2_CLEARANCE_HOLE2_AT_3_PITCH) for i in range(1, M2_CLEARANCE_HOLE2_AT_3_COUNT)]):
        add(m2_clearance_hole2, mode=Mode.SUBTRACT)

    # M2 Clearance Hole2 at 4: M2 Clearance Hole2 ×2
    with Locations(*[(0, i * M2_CLEARANCE_HOLE2_AT_4_PITCH, 0) for i in range(1, M2_CLEARANCE_HOLE2_AT_4_COUNT)]):
        add(m2_clearance_hole2, mode=Mode.SUBTRACT)

    # Mirror2: Cut-Extrude8, M2 Clearance Hole2 across plane
    add(cut_extrude8.mirror(Plane(origin=(0, 0, 0), x_dir=(0, 0, 1), z_dir=(1, 0, 0))), mode=Mode.SUBTRACT)
    add(m2_clearance_hole2.mirror(Plane(origin=(0, 0, 0), x_dir=(0, 0, 1), z_dir=(1, 0, 0))), mode=Mode.SUBTRACT)

    # Mirror2 copy 1 sketch → Mirror2 copy 1 (revolve, cut)
    with BuildSketch(Plane(origin=(-53.975, -48.816666667, -5), x_dir=(0, 0, -1), z_dir=(0, 1, 0))):
        Polygon((0, 0), (0, -15.721028143), (1.2, -14.9999954), (1.2, 0), align=None)
    revolve(axis=Axis((-60.325, -48.816666667, -5), (-1, 0, 0)), mode=Mode.SUBTRACT)

    # Mirror2 copy 2 sketch → Mirror2 copy 2 (revolve, cut)
    with BuildSketch(Plane(origin=(-53.975, -0.816666667, -5), x_dir=(0, 0, -1), z_dir=(0, 1, 0))):
        Polygon((0, 0), (0, -15.721028143), (1.2, -14.9999954), (1.2, 0), align=None)
    revolve(axis=Axis((-60.325, -0.816666667, -5), (-1, 0, 0)), mode=Mode.SUBTRACT)

    # Mirror2 copy 3 sketch → Mirror2 copy 3 (revolve, cut)
    with BuildSketch(Plane(origin=(-53.975, -0.816666667, 5), x_dir=(0, 0, -1), z_dir=(0, 1, 0))):
        Polygon((0, 0), (0, -15.721028143), (1.2, -14.9999954), (1.2, 0), align=None)
    revolve(axis=Axis((-60.325, -0.816666667, 5), (-1, 0, 0)), mode=Mode.SUBTRACT)

    # 1/4 Clearance Hole1 (through all)
    with Locations(Plane(origin=(0, -57.15, 0), x_dir=(1, 0, 0), z_dir=(0, 1, 0))):
        with Locations((-15.875, 15.875)):
            f_1_4_clearance_hole1 = Hole(F_1_4_CLEARANCE_HOLE1_D / 2)

    # Sketch53 → Cut-Extrude9 (cut)
    with BuildSketch(Plane(origin=(0, -57.15, 0), x_dir=(1, 0, 0), z_dir=(0, 1, 0))):
        with Locations((-15.875, 15.875)):
            Rectangle(SKETCH53_W, SKETCH53_H)
    cut_extrude9 = extrude(amount=-CUT_EXTRUDE9_DEPTH, mode=Mode.SUBTRACT)

    # Sketch-Pattern1: 1/4 Clearance Hole1, Cut-Extrude9 at 3 more places
    with Locations((31.75, 0, 0), (31.75, 0, 31.75), (0, 0, 31.75)):
        add(f_1_4_clearance_hole1, mode=Mode.SUBTRACT)
        add(cut_extrude9, mode=Mode.SUBTRACT)

    # 3/8 Clearance Hole5 (through all)
    with Locations(Plane(origin=(0, -57.15, 0), x_dir=(1, 0, 0), z_dir=(0, 1, 0))):
        with Locations((0, 0)):
            Hole(F_3_8_CLEARANCE_HOLE5_D / 2)


with BuildPart() as body_2:
    # uxcell-FR6ZZ: read off the stored shape, not the designer's step
    # uxcell-FR6ZZ outline → uxcell-FR6ZZ (revolve)
    with BuildSketch(Plane.XY):
        Polygon((12.303125, 7.14375), (4.7625, 7.14375), (4.7625, -0.381), (11.1125, -0.381), (11.1125, 4.778375), (11.509375, 5.17525), (12.303125, 5.17525), align=None)
    revolve(axis=Axis((0, 0, 0), (0, 1, 0)))


with BuildPart() as body_2_1:
    # Body-Move/Copy2: read off the stored shape, not the designer's step
    # Body-Move/Copy2: moved
    add(body_2.part.moved(Location((0, -64.29375, 0))))


with BuildPart() as part_1:
    add(part.part)

    # Combine1: cut body 2
    add(body_2_1.part, mode=Mode.SUBTRACT)


solid = part_1.part
